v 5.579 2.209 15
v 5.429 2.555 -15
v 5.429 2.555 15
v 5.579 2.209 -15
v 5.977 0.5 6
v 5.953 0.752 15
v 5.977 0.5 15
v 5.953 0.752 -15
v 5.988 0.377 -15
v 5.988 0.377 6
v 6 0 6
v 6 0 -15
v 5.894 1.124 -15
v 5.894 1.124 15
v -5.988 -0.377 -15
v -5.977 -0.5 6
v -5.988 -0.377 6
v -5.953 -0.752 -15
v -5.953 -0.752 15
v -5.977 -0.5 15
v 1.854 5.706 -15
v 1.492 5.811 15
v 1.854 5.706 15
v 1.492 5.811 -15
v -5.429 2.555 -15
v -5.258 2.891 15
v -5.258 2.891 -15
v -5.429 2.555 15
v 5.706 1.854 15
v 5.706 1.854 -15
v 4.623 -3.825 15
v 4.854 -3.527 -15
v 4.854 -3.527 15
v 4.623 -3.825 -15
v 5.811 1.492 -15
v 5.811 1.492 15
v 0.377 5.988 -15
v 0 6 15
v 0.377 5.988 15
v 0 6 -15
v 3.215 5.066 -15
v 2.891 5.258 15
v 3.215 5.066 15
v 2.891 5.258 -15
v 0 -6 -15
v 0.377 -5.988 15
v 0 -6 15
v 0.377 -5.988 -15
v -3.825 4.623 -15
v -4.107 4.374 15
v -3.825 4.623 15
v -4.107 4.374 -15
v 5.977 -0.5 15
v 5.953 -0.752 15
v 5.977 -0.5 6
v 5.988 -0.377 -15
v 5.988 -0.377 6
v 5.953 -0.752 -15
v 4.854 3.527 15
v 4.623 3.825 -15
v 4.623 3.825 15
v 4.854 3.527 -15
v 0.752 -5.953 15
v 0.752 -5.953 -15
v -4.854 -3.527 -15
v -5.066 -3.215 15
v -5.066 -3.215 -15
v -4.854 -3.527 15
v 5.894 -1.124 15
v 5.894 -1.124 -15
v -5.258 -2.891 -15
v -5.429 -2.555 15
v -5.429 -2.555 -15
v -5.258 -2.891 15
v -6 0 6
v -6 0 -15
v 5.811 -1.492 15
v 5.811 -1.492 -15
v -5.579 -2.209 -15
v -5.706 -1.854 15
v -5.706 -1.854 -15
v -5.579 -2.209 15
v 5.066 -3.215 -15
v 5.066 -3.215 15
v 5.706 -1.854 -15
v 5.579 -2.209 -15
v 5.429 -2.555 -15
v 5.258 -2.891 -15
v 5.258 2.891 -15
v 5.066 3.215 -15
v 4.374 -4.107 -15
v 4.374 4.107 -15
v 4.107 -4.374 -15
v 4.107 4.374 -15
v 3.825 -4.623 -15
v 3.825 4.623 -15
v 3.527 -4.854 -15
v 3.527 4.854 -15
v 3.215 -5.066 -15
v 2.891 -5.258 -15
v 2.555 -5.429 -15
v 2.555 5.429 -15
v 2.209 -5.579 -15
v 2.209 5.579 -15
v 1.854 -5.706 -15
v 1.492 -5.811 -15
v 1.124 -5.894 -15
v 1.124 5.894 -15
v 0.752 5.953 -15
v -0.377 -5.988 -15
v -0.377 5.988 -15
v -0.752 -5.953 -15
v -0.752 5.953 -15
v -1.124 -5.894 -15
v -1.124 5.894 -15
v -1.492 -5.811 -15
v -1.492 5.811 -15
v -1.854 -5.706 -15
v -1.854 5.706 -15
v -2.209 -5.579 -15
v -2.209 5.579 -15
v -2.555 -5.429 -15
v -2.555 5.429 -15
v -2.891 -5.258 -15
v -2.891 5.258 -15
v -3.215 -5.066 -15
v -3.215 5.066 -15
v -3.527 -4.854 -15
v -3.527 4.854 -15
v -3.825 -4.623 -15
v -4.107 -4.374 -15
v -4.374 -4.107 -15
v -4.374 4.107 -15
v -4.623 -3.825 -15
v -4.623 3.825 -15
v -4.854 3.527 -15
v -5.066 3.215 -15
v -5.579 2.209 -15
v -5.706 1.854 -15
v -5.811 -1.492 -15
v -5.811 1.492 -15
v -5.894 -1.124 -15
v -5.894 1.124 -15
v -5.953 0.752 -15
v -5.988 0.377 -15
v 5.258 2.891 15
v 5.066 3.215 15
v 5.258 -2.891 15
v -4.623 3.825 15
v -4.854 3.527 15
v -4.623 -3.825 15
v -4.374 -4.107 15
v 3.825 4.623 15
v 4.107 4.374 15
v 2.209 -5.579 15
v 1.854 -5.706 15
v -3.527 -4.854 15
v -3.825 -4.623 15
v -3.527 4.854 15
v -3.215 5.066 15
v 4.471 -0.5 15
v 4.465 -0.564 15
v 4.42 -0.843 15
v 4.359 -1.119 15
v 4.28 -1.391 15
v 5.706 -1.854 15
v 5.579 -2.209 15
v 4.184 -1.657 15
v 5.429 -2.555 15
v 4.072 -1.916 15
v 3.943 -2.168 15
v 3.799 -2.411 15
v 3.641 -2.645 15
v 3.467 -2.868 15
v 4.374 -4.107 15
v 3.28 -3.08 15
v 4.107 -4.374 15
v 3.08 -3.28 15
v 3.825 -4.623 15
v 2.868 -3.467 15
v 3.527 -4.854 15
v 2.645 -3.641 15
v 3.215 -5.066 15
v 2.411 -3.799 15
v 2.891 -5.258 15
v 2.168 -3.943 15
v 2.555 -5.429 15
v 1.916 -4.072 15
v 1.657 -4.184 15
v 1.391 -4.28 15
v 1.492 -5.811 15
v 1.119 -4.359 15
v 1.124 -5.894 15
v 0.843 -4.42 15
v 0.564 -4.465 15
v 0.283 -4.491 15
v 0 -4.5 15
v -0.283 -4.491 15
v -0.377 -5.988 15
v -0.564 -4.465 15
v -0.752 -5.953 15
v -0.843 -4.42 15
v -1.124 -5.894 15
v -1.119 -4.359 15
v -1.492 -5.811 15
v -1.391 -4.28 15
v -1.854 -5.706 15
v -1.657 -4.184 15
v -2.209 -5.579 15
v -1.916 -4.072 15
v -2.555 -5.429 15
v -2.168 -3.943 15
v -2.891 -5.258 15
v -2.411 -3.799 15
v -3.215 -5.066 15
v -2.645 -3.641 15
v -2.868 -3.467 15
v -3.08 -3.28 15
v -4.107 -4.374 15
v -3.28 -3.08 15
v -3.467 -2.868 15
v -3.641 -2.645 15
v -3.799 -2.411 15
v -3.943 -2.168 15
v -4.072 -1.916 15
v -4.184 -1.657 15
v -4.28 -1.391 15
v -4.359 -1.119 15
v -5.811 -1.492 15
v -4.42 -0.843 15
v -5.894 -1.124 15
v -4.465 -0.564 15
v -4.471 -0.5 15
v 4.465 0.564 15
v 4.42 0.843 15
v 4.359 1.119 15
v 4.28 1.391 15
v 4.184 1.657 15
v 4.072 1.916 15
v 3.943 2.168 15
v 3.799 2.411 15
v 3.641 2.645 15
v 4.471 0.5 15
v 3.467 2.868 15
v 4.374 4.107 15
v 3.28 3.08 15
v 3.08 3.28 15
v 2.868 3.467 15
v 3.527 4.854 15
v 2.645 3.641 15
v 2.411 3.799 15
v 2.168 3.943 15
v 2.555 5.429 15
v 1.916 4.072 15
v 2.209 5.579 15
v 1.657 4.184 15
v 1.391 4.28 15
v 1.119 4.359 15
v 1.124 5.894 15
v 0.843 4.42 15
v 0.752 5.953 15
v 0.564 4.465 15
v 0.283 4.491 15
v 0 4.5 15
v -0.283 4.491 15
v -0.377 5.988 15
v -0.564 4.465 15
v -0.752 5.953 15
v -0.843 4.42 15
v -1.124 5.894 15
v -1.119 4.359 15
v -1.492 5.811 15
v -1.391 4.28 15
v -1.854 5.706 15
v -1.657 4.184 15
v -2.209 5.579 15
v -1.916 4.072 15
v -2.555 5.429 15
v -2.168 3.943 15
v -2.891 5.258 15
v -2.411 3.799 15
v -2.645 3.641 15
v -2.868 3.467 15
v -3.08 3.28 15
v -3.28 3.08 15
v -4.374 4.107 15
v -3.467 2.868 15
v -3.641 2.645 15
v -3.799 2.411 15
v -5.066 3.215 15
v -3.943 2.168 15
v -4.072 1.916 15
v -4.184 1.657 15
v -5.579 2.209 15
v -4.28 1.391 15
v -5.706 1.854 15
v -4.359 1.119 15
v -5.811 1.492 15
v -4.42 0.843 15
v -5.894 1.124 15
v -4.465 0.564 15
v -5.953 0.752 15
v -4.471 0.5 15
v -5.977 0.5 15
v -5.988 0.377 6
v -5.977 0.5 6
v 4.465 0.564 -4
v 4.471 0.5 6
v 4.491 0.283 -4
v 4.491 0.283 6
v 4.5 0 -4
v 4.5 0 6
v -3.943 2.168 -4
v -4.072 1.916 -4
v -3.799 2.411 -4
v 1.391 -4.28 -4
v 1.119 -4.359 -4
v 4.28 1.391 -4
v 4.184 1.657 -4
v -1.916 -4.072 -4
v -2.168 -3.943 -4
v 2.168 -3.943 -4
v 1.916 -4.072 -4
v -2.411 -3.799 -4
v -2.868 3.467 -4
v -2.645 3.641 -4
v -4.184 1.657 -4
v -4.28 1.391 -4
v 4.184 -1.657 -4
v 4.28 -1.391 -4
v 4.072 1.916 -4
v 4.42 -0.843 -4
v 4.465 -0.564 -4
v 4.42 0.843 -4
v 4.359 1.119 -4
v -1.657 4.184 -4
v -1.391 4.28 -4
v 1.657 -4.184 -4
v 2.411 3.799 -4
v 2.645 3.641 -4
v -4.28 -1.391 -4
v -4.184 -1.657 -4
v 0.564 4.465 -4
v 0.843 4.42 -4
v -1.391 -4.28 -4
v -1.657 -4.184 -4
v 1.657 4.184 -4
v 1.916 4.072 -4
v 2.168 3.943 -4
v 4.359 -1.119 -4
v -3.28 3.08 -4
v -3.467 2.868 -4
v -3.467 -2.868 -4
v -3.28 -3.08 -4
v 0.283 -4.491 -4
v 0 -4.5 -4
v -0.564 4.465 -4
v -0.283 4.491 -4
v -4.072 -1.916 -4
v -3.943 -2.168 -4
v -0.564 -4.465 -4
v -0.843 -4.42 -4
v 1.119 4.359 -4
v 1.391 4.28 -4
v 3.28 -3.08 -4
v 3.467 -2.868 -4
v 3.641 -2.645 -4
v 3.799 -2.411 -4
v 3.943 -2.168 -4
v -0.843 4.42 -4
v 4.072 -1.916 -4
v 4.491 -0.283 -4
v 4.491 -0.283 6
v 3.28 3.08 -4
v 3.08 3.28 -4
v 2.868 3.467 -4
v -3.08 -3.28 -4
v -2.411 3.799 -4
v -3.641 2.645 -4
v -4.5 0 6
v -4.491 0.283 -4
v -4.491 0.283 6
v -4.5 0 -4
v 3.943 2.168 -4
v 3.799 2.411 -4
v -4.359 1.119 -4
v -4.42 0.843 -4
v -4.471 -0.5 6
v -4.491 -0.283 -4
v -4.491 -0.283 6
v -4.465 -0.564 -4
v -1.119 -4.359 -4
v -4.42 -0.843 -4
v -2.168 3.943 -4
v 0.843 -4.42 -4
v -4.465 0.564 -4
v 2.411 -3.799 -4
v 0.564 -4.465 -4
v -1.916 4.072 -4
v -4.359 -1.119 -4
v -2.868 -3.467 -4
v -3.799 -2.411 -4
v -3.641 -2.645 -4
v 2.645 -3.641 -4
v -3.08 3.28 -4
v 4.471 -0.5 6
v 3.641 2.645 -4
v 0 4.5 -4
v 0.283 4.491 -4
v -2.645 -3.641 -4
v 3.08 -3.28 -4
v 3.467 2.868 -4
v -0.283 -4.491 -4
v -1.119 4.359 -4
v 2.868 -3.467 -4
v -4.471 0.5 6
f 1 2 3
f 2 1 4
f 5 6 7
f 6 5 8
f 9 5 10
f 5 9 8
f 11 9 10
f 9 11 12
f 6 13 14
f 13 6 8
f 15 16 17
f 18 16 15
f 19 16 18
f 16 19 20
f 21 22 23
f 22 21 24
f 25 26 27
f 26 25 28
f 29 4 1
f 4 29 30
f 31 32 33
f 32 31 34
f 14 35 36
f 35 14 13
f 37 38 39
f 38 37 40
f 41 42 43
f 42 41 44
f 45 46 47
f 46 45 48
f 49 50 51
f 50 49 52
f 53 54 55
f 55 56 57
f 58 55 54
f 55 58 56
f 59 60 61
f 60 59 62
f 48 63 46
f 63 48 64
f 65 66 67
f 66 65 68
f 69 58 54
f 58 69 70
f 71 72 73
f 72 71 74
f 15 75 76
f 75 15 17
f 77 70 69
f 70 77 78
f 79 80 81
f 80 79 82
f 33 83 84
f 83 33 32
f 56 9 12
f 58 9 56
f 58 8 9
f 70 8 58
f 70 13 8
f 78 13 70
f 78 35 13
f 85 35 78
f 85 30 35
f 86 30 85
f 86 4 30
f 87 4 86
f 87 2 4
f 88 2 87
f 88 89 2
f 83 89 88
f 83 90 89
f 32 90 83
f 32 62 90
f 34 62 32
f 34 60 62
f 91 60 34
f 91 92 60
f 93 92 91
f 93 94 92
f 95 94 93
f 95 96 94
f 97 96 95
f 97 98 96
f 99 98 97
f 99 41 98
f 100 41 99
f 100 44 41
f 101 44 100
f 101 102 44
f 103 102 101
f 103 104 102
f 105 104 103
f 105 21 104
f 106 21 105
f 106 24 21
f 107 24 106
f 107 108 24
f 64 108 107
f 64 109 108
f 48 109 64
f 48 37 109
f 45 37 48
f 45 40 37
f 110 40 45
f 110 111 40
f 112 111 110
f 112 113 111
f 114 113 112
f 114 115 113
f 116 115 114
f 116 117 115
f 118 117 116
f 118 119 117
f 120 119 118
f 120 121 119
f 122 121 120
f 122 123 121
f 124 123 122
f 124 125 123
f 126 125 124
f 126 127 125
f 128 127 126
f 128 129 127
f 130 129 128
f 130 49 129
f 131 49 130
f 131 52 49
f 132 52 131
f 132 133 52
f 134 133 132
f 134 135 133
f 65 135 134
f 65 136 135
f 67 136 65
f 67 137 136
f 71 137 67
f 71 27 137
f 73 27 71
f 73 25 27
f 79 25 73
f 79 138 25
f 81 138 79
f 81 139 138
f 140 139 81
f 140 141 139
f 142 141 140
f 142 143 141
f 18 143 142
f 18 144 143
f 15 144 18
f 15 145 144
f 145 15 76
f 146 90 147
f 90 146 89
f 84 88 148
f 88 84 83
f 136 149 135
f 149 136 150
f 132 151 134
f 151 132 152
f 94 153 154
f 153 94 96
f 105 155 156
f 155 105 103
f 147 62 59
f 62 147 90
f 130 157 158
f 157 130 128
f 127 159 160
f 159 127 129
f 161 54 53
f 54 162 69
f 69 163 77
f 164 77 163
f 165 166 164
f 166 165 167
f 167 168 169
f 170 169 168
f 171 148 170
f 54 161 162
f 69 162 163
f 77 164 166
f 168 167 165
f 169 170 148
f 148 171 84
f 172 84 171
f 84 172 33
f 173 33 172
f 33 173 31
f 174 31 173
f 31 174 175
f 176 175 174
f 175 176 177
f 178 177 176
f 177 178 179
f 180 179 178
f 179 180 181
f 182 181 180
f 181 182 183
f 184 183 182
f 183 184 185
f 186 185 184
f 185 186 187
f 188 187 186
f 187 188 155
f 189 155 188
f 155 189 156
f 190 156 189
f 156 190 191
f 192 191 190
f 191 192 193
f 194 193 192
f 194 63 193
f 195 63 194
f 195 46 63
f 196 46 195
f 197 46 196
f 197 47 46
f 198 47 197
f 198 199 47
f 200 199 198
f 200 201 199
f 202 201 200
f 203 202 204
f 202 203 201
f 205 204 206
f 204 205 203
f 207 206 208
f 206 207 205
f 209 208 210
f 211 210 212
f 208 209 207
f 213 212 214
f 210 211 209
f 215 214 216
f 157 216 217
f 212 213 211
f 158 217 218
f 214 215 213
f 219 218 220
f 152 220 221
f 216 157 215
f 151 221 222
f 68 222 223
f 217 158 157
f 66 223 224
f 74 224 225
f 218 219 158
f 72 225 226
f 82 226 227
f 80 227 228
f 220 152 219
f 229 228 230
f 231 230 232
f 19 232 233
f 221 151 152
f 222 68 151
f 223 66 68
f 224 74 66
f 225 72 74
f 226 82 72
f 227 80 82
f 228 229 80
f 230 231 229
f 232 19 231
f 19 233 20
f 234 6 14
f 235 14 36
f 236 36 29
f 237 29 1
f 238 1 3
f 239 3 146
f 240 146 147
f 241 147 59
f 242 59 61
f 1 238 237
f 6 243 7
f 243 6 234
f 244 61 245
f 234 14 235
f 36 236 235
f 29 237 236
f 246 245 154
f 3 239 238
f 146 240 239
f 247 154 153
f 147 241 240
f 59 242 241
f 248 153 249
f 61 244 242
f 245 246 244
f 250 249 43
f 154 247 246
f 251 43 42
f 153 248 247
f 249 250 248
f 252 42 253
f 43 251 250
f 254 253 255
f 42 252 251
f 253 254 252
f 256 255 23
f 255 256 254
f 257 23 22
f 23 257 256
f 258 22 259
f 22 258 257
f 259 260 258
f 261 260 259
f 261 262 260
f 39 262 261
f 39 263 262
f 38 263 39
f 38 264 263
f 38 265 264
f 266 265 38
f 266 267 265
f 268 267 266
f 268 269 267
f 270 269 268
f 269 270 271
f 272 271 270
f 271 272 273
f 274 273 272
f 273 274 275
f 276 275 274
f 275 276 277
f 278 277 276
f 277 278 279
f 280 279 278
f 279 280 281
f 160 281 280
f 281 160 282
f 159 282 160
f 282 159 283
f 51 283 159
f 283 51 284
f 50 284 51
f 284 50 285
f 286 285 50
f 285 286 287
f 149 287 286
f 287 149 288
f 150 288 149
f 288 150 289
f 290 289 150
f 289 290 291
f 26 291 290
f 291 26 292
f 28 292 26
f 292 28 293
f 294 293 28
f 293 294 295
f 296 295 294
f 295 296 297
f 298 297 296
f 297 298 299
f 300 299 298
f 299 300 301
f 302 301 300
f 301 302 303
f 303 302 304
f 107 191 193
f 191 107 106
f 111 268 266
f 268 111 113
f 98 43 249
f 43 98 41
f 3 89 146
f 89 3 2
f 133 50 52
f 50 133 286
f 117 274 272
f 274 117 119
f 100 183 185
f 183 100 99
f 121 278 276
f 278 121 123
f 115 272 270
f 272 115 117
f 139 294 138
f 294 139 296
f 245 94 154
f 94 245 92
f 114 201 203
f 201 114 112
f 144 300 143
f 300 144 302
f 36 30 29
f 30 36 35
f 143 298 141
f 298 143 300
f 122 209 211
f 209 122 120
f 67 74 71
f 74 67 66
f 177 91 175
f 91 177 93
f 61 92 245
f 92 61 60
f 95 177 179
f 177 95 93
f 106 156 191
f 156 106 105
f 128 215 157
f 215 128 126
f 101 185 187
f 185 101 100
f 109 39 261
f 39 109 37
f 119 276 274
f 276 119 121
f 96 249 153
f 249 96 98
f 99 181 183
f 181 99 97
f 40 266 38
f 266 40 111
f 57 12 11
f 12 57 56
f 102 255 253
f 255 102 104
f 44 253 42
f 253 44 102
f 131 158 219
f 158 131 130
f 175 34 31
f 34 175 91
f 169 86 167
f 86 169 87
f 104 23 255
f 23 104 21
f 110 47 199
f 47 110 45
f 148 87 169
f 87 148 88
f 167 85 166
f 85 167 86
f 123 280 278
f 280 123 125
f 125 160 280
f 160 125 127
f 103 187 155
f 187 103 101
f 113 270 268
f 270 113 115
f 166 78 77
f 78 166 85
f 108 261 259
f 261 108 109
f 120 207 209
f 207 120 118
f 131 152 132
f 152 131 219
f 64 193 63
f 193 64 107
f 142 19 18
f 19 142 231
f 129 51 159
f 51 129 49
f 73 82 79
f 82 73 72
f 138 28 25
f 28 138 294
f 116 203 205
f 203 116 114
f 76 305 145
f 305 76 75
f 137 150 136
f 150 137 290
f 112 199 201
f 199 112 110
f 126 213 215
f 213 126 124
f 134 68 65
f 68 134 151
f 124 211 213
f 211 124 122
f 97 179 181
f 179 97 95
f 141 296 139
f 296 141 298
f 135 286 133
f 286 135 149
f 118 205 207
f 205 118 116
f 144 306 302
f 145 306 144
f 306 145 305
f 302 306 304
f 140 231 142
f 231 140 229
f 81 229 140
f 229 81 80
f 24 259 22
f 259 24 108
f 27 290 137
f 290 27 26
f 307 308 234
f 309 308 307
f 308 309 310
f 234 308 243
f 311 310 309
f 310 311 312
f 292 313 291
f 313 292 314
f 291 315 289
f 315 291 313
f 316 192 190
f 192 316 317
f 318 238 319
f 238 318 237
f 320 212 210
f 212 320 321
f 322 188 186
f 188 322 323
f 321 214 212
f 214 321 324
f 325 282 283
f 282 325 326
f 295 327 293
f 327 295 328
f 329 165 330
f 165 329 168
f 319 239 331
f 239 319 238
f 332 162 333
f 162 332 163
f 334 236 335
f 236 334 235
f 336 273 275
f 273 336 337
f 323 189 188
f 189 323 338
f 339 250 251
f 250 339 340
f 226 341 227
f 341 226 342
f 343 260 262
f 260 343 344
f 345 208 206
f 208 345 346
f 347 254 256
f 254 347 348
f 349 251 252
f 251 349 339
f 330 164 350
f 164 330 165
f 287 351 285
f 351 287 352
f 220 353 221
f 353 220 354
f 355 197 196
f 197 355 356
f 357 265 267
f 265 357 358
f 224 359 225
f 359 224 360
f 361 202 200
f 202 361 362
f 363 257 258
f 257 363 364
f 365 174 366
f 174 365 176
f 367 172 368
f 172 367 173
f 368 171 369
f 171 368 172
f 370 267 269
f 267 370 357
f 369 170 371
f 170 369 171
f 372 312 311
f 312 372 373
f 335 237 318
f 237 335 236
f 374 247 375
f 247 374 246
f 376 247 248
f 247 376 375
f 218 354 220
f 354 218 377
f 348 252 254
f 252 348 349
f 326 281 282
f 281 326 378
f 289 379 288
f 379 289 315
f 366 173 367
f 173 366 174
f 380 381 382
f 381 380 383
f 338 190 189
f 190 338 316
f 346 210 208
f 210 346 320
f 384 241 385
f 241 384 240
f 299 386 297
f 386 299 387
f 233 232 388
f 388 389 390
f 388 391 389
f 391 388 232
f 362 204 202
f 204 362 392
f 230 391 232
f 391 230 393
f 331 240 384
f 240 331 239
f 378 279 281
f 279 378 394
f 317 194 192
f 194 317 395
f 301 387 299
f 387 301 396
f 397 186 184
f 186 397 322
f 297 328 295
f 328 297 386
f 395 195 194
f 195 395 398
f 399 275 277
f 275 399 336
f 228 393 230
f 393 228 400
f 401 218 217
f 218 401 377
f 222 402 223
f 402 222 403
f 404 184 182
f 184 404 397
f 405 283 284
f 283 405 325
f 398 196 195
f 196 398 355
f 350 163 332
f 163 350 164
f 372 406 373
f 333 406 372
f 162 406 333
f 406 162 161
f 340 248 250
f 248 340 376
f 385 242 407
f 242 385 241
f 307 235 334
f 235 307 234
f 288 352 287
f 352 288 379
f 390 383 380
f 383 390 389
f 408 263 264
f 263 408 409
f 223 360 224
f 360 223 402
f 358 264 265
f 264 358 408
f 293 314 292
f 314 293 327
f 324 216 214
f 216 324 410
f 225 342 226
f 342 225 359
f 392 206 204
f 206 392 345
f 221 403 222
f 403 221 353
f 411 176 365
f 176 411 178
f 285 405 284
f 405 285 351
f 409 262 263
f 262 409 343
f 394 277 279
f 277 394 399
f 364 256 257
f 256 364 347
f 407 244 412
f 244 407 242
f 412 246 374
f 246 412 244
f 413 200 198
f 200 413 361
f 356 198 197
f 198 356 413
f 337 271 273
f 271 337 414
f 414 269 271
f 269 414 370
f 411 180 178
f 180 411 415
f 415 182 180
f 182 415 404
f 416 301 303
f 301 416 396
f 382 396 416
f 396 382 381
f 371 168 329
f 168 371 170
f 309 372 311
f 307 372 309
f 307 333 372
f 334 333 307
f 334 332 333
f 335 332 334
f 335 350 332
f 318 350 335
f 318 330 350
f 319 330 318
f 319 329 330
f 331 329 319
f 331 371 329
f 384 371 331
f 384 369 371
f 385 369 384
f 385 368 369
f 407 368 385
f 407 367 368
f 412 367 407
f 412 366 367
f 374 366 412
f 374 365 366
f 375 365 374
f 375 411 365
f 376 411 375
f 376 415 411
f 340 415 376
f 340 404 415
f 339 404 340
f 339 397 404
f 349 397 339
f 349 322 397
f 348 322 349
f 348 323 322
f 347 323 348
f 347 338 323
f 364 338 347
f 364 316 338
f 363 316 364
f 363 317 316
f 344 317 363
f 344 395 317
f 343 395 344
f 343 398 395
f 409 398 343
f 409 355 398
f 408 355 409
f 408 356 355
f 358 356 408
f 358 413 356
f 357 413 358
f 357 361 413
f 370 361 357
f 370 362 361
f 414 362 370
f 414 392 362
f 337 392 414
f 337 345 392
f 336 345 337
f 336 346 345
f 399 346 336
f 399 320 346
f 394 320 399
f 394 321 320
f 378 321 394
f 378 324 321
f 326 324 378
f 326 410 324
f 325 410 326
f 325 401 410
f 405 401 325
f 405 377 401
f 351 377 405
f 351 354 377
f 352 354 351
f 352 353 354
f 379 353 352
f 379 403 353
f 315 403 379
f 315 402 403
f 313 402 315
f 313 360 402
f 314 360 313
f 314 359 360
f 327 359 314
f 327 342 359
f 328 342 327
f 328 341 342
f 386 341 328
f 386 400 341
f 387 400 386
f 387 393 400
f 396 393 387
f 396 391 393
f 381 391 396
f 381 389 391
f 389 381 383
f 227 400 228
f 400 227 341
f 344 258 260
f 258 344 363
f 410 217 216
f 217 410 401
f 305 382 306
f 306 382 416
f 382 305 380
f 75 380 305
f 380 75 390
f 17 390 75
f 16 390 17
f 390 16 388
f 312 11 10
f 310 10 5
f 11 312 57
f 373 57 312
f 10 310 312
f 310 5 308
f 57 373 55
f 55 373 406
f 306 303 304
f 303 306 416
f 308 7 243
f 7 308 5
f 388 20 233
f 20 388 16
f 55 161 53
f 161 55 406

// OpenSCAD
//Wheel -->engine socket test

walltich = 1; //Espessura parede
axle = 5; // raio eixo motor
ajuste = 0.5; //valor para ajuste do encaixe do motor
$fn = 100;

rotate([0,0,0]) difference() {
    cylinder(h=30,r=axle+walltich,center=true);
    translate([0,0,6]) cylinder(h=20,r=axle-ajuste,center=true);
    translate([0,0,11]) #cube([30,1,10], center = true);
    
}
